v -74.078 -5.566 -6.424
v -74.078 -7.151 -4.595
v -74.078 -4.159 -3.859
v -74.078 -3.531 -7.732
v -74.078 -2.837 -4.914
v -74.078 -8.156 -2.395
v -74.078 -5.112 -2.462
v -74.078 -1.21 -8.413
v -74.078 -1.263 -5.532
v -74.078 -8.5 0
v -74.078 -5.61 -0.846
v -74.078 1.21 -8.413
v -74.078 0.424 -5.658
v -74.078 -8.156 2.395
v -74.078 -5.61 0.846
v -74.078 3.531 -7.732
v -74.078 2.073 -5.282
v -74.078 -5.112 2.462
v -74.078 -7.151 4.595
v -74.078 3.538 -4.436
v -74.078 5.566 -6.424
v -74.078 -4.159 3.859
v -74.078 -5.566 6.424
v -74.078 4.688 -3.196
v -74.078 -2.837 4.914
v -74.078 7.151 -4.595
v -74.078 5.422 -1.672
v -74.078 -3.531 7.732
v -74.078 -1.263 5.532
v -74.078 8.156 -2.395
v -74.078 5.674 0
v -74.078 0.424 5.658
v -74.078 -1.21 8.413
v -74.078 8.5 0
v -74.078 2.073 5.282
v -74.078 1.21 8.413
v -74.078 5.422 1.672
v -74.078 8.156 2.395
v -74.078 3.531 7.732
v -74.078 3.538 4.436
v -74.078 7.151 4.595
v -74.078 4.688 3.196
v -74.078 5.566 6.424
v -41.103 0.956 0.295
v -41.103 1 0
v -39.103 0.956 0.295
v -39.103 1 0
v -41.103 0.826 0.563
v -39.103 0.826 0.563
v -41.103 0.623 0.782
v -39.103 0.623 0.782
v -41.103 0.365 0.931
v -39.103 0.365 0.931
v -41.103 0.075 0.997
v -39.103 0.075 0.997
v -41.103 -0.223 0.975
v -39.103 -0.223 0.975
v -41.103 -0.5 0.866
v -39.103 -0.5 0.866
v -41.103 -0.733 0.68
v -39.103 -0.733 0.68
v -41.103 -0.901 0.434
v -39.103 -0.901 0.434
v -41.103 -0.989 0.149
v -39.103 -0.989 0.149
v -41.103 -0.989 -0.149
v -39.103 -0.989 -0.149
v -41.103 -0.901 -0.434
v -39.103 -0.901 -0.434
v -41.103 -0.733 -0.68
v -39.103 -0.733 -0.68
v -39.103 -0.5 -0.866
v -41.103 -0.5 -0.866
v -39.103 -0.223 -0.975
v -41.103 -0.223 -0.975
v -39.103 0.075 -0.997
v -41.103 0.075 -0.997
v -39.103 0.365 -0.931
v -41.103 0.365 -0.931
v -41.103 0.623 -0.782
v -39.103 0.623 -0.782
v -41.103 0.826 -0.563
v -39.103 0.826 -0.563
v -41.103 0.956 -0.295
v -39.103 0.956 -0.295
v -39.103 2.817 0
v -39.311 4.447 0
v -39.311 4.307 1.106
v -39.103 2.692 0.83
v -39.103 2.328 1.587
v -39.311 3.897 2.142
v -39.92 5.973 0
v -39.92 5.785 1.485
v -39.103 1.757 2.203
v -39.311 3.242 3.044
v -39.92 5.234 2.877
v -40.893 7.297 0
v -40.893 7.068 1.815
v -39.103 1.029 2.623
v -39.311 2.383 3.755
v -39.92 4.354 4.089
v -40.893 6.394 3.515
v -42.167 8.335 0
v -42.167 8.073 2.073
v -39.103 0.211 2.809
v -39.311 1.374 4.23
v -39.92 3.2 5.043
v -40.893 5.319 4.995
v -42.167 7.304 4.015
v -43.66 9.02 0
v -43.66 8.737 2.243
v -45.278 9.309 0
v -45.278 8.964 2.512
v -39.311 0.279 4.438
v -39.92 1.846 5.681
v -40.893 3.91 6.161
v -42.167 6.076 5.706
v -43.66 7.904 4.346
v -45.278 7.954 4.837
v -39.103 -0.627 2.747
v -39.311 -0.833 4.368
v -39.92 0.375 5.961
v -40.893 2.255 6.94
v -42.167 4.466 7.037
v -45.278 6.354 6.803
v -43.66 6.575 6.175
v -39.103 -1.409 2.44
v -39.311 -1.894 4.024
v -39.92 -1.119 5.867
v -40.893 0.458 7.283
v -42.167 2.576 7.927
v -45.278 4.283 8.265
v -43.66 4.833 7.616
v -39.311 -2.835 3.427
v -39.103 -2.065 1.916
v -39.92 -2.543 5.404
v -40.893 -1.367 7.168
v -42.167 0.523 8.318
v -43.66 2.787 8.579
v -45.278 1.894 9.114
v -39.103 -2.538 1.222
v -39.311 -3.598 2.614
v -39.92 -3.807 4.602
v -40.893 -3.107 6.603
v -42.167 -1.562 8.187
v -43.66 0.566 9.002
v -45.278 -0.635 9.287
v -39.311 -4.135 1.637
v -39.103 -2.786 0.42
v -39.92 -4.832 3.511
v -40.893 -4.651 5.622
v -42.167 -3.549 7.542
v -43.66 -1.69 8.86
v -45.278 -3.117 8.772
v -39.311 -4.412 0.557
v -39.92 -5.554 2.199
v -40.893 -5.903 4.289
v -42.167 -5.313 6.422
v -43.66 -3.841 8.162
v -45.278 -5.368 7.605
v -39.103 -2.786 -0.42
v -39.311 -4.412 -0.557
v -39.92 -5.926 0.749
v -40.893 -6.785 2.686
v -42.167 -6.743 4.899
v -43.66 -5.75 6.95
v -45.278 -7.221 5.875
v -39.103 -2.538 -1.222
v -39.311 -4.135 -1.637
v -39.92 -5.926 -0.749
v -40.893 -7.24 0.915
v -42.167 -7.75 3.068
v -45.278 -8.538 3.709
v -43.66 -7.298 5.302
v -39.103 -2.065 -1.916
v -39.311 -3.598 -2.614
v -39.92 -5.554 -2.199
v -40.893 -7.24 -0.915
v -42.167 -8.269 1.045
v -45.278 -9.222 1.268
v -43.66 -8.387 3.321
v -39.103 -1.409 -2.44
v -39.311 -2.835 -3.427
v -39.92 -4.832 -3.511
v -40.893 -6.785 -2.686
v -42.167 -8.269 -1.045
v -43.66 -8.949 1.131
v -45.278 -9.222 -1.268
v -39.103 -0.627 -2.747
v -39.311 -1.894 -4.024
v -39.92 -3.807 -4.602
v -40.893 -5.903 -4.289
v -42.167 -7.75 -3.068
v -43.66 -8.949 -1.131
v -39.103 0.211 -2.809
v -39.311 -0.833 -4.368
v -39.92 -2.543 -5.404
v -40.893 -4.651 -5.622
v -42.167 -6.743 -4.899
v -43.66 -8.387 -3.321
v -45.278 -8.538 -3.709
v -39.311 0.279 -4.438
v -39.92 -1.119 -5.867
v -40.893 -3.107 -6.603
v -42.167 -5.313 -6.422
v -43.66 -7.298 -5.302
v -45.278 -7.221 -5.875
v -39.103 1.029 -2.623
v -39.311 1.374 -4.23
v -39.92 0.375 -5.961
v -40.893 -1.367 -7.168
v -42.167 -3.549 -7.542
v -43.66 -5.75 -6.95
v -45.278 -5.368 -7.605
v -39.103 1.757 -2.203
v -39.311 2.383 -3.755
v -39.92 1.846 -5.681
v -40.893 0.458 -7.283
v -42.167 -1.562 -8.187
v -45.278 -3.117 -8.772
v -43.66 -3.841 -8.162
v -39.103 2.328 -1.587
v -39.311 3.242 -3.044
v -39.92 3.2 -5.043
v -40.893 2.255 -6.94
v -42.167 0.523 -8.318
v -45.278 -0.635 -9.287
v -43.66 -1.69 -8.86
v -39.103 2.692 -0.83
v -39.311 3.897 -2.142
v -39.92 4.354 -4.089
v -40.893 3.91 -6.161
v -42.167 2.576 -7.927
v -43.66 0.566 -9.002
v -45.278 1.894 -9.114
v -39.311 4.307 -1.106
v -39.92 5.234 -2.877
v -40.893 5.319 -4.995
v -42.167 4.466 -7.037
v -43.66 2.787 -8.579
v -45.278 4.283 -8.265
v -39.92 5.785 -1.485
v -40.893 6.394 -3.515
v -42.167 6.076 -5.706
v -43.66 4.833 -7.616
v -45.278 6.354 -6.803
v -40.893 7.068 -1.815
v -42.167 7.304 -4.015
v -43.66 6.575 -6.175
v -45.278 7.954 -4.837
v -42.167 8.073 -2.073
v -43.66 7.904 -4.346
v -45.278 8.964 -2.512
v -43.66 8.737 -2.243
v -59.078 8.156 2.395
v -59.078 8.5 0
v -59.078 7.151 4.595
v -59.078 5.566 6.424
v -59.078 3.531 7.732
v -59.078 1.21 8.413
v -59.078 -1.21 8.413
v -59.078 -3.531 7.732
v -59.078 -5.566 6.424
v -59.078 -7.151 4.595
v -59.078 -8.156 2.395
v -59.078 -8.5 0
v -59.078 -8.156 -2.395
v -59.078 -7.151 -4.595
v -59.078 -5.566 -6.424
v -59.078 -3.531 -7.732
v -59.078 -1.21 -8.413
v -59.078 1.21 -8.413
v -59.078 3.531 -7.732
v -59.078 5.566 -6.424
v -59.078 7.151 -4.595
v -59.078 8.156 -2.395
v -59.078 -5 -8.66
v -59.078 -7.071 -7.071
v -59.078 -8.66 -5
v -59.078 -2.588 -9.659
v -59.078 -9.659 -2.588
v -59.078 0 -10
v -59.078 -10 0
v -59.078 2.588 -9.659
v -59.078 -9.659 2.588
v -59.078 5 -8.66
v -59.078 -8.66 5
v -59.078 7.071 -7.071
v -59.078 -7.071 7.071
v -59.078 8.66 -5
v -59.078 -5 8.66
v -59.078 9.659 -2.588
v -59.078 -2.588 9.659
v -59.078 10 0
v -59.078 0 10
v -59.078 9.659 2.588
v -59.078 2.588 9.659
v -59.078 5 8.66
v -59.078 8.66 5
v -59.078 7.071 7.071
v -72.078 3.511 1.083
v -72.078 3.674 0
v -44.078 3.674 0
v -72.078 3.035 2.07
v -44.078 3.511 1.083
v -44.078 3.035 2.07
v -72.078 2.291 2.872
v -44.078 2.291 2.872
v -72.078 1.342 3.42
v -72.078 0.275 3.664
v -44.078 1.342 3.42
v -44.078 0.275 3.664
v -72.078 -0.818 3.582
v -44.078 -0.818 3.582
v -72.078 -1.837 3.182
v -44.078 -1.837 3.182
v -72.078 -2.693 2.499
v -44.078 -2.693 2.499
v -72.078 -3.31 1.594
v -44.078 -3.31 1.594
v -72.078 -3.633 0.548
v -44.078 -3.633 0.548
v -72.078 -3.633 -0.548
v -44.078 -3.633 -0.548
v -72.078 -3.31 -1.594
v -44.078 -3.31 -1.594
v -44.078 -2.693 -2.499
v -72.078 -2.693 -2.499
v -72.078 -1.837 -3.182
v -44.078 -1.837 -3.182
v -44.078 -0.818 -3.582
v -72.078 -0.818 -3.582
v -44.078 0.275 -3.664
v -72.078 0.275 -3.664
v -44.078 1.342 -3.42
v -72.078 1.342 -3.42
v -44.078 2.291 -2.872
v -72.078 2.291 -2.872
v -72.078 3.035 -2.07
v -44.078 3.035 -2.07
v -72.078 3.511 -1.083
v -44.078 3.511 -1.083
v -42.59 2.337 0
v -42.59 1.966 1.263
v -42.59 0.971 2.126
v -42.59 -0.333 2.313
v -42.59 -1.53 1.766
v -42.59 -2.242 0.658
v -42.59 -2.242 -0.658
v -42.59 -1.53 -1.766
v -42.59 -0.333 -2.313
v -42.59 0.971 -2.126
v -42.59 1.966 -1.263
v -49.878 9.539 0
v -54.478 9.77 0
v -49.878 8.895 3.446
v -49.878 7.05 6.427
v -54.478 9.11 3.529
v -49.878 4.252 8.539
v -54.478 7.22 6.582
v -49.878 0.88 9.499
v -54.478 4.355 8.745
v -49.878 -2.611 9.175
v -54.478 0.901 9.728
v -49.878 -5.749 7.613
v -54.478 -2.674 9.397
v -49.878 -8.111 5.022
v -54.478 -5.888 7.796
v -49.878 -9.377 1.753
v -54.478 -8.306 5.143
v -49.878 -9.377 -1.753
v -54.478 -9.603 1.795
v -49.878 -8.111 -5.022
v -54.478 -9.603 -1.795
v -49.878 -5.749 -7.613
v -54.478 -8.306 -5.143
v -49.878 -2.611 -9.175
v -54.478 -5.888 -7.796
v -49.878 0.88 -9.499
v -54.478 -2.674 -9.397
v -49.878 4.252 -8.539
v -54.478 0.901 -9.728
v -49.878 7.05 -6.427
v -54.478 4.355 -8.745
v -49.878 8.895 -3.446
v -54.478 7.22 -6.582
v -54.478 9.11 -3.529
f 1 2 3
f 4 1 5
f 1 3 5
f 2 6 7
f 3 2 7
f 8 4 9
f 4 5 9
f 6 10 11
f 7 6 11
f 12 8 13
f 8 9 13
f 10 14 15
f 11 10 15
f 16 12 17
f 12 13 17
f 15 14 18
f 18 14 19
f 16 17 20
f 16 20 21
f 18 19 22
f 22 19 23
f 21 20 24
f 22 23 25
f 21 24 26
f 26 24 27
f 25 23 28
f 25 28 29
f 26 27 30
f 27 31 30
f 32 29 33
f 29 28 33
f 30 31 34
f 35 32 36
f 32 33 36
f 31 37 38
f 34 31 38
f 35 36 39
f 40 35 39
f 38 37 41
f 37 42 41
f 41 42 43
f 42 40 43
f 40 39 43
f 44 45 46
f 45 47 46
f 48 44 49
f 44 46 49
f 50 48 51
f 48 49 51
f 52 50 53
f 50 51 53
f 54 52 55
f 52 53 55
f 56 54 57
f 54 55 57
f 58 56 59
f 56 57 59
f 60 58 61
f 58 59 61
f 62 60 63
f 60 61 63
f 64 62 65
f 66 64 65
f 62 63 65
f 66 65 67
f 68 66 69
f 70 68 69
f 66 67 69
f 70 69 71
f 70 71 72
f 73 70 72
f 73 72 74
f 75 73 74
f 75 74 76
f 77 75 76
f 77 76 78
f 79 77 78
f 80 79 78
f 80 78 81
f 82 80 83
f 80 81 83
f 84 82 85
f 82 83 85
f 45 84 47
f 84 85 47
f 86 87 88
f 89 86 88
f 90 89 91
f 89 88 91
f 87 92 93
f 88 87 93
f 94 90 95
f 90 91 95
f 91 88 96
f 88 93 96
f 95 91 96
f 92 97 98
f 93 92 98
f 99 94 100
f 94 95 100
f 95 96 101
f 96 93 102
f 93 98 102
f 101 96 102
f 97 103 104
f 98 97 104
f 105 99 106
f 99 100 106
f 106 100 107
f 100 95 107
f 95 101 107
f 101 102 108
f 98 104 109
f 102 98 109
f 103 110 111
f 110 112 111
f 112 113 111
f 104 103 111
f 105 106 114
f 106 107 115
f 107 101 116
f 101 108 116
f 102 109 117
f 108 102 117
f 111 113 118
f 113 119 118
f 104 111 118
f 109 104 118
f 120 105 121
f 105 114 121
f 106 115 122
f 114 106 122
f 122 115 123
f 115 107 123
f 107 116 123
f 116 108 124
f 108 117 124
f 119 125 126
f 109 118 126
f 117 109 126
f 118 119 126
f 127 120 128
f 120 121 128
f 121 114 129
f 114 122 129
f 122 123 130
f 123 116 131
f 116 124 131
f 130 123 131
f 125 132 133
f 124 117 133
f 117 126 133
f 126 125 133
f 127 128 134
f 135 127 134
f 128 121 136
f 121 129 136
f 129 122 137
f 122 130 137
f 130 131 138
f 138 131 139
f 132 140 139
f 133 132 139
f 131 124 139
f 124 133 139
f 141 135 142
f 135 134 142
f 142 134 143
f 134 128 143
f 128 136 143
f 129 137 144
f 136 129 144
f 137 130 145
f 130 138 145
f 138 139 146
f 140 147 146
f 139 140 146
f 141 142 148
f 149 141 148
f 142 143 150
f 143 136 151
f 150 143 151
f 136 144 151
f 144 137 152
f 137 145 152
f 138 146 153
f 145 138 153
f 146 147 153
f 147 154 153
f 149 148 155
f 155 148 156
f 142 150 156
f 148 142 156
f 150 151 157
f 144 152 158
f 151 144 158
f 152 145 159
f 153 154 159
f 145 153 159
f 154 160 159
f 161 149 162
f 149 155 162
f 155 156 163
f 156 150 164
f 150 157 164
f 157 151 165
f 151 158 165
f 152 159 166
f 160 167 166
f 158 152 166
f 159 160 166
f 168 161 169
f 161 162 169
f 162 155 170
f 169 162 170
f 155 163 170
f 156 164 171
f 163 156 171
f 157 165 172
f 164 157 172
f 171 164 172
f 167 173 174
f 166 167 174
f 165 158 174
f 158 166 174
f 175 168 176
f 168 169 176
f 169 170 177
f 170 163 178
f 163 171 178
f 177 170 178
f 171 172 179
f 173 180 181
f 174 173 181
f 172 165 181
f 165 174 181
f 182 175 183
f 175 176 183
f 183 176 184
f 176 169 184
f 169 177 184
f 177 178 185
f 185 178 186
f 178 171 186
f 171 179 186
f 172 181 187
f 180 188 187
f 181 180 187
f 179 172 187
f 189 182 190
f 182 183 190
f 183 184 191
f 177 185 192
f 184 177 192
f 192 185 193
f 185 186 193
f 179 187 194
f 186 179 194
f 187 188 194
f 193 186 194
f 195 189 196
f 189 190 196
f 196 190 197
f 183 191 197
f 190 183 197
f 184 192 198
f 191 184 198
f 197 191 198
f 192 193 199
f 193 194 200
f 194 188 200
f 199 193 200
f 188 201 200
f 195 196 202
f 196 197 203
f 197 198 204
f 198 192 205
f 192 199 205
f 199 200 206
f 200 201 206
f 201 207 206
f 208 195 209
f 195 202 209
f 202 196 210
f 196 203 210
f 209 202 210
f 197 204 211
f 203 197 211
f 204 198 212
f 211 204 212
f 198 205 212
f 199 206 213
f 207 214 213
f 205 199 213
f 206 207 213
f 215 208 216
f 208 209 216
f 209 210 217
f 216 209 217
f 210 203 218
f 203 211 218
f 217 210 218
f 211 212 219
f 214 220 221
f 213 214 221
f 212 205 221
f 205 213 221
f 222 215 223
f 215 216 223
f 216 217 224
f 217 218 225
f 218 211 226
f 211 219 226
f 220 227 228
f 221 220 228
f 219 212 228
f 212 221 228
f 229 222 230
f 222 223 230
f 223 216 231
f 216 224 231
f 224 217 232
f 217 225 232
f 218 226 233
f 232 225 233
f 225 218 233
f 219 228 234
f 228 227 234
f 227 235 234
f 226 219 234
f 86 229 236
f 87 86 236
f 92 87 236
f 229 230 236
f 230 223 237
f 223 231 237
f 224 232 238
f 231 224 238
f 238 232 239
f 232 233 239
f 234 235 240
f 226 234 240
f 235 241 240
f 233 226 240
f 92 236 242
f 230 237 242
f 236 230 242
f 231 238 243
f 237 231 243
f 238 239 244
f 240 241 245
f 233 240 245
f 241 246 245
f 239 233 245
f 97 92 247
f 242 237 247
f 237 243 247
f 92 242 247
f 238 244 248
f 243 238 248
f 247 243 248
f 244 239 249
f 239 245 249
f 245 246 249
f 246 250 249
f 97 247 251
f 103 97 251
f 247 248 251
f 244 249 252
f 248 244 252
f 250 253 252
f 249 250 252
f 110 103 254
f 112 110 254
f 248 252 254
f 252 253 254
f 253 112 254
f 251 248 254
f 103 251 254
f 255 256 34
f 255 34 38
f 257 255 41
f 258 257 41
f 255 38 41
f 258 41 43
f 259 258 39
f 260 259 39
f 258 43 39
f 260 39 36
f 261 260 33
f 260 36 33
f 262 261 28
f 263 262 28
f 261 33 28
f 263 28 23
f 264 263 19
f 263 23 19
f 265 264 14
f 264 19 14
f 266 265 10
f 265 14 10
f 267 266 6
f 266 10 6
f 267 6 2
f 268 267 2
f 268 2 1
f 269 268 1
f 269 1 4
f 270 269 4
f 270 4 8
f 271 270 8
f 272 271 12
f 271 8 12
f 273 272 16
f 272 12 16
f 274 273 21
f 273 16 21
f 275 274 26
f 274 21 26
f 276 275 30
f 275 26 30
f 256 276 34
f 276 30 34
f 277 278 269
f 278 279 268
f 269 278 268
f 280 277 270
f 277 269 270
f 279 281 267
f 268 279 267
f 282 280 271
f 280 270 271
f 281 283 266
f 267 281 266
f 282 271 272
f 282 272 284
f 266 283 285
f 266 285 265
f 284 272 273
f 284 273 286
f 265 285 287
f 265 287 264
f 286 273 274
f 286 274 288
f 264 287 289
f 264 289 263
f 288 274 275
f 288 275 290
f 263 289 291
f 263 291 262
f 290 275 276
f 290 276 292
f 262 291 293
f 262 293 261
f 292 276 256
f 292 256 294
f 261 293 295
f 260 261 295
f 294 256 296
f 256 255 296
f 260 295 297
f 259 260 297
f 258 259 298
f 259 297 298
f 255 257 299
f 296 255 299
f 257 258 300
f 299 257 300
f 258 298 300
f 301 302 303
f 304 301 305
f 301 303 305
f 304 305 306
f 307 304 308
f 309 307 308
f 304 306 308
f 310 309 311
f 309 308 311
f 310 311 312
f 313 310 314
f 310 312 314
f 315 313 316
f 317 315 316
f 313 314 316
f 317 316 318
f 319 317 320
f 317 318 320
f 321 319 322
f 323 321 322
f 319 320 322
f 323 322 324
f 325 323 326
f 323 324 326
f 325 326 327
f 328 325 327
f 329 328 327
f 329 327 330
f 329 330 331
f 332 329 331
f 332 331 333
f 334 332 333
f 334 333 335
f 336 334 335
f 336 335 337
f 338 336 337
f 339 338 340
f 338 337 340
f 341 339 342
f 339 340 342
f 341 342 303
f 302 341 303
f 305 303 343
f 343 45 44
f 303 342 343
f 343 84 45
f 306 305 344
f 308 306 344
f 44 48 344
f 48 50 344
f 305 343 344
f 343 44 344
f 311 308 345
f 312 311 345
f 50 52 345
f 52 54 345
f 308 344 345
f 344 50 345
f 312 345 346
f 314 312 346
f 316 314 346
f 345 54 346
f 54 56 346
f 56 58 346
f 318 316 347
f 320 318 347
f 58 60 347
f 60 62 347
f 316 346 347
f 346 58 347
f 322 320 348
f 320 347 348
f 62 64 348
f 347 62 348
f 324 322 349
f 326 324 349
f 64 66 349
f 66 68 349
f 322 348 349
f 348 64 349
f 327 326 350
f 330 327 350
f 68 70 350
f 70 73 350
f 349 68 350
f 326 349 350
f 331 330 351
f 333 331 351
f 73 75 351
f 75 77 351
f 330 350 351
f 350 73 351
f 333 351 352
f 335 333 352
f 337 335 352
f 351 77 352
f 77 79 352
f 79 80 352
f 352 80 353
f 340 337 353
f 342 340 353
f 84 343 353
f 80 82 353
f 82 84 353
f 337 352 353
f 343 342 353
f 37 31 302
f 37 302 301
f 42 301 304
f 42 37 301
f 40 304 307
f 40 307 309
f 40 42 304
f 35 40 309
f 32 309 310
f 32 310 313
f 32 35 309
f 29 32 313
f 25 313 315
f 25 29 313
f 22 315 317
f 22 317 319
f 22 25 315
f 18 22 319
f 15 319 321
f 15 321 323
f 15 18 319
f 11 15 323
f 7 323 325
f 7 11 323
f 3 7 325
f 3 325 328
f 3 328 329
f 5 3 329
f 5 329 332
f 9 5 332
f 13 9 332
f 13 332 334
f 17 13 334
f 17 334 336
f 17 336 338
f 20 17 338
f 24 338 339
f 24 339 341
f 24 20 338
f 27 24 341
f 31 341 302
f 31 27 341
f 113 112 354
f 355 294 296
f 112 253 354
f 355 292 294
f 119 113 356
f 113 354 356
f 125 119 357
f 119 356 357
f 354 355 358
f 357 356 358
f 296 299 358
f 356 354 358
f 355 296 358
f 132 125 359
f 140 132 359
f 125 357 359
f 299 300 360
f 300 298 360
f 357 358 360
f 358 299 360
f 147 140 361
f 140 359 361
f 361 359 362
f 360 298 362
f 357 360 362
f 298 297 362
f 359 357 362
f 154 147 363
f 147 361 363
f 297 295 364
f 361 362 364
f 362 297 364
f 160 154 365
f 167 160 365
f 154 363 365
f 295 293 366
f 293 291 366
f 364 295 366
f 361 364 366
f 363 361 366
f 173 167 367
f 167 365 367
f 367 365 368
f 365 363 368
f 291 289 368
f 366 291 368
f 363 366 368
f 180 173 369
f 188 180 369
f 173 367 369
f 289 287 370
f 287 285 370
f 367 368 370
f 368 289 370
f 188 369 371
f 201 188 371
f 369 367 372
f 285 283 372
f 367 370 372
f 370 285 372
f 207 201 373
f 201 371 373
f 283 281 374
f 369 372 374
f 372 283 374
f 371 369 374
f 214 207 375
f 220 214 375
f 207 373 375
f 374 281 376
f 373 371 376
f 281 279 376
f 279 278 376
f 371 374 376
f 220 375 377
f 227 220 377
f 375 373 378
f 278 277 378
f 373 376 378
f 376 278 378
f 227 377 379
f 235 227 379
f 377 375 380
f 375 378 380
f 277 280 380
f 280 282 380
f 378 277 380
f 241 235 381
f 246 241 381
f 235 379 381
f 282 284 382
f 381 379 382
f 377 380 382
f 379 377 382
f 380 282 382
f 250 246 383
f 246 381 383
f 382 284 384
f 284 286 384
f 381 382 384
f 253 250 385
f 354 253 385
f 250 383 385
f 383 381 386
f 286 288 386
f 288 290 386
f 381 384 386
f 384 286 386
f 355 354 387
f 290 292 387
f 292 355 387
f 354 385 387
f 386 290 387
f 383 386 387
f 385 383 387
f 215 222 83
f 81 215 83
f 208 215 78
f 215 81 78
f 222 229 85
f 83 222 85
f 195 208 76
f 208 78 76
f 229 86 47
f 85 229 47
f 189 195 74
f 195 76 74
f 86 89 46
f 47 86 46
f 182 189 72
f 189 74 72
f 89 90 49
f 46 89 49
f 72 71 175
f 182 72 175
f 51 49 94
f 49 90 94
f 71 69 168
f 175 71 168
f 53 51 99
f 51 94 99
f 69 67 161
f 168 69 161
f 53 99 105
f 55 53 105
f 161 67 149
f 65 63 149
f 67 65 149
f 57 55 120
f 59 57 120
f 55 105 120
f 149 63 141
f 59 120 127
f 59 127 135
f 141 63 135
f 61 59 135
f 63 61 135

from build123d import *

# Parameters (mm, degrees)
F2_R    = 6.5
F3_SIZE = 2


with BuildPart() as f1:
    # F0 (on Top) → F1 (revolve)
    with BuildSketch(Plane.XY):
        Polygon((-74.077871, 8.5), (-74.077871, 3.673849), (-44.077871, 3.673849), (-41.102886, 1), (-39.102886, 1), (-39.102886, 9), (-59.077871, 10), (-59.077871, 8.5), align=None)
    revolve(axis=Axis((5.52991, 0, 0), (1, 0, 0)))

    # F2
    f2_edges = [f1.edges().sort_by_distance(p)[0] for p in [
        (-39.102886, -9, 0),
    ]]
    fillet(f2_edges, radius=F2_R)

    # F3
    f3_edges = [f1.edges().sort_by_distance(p)[0] for p in [
        (-74.077871, -3.673849, 0),
    ]]
    chamfer(f3_edges, length=F3_SIZE)


solid = f1.part
